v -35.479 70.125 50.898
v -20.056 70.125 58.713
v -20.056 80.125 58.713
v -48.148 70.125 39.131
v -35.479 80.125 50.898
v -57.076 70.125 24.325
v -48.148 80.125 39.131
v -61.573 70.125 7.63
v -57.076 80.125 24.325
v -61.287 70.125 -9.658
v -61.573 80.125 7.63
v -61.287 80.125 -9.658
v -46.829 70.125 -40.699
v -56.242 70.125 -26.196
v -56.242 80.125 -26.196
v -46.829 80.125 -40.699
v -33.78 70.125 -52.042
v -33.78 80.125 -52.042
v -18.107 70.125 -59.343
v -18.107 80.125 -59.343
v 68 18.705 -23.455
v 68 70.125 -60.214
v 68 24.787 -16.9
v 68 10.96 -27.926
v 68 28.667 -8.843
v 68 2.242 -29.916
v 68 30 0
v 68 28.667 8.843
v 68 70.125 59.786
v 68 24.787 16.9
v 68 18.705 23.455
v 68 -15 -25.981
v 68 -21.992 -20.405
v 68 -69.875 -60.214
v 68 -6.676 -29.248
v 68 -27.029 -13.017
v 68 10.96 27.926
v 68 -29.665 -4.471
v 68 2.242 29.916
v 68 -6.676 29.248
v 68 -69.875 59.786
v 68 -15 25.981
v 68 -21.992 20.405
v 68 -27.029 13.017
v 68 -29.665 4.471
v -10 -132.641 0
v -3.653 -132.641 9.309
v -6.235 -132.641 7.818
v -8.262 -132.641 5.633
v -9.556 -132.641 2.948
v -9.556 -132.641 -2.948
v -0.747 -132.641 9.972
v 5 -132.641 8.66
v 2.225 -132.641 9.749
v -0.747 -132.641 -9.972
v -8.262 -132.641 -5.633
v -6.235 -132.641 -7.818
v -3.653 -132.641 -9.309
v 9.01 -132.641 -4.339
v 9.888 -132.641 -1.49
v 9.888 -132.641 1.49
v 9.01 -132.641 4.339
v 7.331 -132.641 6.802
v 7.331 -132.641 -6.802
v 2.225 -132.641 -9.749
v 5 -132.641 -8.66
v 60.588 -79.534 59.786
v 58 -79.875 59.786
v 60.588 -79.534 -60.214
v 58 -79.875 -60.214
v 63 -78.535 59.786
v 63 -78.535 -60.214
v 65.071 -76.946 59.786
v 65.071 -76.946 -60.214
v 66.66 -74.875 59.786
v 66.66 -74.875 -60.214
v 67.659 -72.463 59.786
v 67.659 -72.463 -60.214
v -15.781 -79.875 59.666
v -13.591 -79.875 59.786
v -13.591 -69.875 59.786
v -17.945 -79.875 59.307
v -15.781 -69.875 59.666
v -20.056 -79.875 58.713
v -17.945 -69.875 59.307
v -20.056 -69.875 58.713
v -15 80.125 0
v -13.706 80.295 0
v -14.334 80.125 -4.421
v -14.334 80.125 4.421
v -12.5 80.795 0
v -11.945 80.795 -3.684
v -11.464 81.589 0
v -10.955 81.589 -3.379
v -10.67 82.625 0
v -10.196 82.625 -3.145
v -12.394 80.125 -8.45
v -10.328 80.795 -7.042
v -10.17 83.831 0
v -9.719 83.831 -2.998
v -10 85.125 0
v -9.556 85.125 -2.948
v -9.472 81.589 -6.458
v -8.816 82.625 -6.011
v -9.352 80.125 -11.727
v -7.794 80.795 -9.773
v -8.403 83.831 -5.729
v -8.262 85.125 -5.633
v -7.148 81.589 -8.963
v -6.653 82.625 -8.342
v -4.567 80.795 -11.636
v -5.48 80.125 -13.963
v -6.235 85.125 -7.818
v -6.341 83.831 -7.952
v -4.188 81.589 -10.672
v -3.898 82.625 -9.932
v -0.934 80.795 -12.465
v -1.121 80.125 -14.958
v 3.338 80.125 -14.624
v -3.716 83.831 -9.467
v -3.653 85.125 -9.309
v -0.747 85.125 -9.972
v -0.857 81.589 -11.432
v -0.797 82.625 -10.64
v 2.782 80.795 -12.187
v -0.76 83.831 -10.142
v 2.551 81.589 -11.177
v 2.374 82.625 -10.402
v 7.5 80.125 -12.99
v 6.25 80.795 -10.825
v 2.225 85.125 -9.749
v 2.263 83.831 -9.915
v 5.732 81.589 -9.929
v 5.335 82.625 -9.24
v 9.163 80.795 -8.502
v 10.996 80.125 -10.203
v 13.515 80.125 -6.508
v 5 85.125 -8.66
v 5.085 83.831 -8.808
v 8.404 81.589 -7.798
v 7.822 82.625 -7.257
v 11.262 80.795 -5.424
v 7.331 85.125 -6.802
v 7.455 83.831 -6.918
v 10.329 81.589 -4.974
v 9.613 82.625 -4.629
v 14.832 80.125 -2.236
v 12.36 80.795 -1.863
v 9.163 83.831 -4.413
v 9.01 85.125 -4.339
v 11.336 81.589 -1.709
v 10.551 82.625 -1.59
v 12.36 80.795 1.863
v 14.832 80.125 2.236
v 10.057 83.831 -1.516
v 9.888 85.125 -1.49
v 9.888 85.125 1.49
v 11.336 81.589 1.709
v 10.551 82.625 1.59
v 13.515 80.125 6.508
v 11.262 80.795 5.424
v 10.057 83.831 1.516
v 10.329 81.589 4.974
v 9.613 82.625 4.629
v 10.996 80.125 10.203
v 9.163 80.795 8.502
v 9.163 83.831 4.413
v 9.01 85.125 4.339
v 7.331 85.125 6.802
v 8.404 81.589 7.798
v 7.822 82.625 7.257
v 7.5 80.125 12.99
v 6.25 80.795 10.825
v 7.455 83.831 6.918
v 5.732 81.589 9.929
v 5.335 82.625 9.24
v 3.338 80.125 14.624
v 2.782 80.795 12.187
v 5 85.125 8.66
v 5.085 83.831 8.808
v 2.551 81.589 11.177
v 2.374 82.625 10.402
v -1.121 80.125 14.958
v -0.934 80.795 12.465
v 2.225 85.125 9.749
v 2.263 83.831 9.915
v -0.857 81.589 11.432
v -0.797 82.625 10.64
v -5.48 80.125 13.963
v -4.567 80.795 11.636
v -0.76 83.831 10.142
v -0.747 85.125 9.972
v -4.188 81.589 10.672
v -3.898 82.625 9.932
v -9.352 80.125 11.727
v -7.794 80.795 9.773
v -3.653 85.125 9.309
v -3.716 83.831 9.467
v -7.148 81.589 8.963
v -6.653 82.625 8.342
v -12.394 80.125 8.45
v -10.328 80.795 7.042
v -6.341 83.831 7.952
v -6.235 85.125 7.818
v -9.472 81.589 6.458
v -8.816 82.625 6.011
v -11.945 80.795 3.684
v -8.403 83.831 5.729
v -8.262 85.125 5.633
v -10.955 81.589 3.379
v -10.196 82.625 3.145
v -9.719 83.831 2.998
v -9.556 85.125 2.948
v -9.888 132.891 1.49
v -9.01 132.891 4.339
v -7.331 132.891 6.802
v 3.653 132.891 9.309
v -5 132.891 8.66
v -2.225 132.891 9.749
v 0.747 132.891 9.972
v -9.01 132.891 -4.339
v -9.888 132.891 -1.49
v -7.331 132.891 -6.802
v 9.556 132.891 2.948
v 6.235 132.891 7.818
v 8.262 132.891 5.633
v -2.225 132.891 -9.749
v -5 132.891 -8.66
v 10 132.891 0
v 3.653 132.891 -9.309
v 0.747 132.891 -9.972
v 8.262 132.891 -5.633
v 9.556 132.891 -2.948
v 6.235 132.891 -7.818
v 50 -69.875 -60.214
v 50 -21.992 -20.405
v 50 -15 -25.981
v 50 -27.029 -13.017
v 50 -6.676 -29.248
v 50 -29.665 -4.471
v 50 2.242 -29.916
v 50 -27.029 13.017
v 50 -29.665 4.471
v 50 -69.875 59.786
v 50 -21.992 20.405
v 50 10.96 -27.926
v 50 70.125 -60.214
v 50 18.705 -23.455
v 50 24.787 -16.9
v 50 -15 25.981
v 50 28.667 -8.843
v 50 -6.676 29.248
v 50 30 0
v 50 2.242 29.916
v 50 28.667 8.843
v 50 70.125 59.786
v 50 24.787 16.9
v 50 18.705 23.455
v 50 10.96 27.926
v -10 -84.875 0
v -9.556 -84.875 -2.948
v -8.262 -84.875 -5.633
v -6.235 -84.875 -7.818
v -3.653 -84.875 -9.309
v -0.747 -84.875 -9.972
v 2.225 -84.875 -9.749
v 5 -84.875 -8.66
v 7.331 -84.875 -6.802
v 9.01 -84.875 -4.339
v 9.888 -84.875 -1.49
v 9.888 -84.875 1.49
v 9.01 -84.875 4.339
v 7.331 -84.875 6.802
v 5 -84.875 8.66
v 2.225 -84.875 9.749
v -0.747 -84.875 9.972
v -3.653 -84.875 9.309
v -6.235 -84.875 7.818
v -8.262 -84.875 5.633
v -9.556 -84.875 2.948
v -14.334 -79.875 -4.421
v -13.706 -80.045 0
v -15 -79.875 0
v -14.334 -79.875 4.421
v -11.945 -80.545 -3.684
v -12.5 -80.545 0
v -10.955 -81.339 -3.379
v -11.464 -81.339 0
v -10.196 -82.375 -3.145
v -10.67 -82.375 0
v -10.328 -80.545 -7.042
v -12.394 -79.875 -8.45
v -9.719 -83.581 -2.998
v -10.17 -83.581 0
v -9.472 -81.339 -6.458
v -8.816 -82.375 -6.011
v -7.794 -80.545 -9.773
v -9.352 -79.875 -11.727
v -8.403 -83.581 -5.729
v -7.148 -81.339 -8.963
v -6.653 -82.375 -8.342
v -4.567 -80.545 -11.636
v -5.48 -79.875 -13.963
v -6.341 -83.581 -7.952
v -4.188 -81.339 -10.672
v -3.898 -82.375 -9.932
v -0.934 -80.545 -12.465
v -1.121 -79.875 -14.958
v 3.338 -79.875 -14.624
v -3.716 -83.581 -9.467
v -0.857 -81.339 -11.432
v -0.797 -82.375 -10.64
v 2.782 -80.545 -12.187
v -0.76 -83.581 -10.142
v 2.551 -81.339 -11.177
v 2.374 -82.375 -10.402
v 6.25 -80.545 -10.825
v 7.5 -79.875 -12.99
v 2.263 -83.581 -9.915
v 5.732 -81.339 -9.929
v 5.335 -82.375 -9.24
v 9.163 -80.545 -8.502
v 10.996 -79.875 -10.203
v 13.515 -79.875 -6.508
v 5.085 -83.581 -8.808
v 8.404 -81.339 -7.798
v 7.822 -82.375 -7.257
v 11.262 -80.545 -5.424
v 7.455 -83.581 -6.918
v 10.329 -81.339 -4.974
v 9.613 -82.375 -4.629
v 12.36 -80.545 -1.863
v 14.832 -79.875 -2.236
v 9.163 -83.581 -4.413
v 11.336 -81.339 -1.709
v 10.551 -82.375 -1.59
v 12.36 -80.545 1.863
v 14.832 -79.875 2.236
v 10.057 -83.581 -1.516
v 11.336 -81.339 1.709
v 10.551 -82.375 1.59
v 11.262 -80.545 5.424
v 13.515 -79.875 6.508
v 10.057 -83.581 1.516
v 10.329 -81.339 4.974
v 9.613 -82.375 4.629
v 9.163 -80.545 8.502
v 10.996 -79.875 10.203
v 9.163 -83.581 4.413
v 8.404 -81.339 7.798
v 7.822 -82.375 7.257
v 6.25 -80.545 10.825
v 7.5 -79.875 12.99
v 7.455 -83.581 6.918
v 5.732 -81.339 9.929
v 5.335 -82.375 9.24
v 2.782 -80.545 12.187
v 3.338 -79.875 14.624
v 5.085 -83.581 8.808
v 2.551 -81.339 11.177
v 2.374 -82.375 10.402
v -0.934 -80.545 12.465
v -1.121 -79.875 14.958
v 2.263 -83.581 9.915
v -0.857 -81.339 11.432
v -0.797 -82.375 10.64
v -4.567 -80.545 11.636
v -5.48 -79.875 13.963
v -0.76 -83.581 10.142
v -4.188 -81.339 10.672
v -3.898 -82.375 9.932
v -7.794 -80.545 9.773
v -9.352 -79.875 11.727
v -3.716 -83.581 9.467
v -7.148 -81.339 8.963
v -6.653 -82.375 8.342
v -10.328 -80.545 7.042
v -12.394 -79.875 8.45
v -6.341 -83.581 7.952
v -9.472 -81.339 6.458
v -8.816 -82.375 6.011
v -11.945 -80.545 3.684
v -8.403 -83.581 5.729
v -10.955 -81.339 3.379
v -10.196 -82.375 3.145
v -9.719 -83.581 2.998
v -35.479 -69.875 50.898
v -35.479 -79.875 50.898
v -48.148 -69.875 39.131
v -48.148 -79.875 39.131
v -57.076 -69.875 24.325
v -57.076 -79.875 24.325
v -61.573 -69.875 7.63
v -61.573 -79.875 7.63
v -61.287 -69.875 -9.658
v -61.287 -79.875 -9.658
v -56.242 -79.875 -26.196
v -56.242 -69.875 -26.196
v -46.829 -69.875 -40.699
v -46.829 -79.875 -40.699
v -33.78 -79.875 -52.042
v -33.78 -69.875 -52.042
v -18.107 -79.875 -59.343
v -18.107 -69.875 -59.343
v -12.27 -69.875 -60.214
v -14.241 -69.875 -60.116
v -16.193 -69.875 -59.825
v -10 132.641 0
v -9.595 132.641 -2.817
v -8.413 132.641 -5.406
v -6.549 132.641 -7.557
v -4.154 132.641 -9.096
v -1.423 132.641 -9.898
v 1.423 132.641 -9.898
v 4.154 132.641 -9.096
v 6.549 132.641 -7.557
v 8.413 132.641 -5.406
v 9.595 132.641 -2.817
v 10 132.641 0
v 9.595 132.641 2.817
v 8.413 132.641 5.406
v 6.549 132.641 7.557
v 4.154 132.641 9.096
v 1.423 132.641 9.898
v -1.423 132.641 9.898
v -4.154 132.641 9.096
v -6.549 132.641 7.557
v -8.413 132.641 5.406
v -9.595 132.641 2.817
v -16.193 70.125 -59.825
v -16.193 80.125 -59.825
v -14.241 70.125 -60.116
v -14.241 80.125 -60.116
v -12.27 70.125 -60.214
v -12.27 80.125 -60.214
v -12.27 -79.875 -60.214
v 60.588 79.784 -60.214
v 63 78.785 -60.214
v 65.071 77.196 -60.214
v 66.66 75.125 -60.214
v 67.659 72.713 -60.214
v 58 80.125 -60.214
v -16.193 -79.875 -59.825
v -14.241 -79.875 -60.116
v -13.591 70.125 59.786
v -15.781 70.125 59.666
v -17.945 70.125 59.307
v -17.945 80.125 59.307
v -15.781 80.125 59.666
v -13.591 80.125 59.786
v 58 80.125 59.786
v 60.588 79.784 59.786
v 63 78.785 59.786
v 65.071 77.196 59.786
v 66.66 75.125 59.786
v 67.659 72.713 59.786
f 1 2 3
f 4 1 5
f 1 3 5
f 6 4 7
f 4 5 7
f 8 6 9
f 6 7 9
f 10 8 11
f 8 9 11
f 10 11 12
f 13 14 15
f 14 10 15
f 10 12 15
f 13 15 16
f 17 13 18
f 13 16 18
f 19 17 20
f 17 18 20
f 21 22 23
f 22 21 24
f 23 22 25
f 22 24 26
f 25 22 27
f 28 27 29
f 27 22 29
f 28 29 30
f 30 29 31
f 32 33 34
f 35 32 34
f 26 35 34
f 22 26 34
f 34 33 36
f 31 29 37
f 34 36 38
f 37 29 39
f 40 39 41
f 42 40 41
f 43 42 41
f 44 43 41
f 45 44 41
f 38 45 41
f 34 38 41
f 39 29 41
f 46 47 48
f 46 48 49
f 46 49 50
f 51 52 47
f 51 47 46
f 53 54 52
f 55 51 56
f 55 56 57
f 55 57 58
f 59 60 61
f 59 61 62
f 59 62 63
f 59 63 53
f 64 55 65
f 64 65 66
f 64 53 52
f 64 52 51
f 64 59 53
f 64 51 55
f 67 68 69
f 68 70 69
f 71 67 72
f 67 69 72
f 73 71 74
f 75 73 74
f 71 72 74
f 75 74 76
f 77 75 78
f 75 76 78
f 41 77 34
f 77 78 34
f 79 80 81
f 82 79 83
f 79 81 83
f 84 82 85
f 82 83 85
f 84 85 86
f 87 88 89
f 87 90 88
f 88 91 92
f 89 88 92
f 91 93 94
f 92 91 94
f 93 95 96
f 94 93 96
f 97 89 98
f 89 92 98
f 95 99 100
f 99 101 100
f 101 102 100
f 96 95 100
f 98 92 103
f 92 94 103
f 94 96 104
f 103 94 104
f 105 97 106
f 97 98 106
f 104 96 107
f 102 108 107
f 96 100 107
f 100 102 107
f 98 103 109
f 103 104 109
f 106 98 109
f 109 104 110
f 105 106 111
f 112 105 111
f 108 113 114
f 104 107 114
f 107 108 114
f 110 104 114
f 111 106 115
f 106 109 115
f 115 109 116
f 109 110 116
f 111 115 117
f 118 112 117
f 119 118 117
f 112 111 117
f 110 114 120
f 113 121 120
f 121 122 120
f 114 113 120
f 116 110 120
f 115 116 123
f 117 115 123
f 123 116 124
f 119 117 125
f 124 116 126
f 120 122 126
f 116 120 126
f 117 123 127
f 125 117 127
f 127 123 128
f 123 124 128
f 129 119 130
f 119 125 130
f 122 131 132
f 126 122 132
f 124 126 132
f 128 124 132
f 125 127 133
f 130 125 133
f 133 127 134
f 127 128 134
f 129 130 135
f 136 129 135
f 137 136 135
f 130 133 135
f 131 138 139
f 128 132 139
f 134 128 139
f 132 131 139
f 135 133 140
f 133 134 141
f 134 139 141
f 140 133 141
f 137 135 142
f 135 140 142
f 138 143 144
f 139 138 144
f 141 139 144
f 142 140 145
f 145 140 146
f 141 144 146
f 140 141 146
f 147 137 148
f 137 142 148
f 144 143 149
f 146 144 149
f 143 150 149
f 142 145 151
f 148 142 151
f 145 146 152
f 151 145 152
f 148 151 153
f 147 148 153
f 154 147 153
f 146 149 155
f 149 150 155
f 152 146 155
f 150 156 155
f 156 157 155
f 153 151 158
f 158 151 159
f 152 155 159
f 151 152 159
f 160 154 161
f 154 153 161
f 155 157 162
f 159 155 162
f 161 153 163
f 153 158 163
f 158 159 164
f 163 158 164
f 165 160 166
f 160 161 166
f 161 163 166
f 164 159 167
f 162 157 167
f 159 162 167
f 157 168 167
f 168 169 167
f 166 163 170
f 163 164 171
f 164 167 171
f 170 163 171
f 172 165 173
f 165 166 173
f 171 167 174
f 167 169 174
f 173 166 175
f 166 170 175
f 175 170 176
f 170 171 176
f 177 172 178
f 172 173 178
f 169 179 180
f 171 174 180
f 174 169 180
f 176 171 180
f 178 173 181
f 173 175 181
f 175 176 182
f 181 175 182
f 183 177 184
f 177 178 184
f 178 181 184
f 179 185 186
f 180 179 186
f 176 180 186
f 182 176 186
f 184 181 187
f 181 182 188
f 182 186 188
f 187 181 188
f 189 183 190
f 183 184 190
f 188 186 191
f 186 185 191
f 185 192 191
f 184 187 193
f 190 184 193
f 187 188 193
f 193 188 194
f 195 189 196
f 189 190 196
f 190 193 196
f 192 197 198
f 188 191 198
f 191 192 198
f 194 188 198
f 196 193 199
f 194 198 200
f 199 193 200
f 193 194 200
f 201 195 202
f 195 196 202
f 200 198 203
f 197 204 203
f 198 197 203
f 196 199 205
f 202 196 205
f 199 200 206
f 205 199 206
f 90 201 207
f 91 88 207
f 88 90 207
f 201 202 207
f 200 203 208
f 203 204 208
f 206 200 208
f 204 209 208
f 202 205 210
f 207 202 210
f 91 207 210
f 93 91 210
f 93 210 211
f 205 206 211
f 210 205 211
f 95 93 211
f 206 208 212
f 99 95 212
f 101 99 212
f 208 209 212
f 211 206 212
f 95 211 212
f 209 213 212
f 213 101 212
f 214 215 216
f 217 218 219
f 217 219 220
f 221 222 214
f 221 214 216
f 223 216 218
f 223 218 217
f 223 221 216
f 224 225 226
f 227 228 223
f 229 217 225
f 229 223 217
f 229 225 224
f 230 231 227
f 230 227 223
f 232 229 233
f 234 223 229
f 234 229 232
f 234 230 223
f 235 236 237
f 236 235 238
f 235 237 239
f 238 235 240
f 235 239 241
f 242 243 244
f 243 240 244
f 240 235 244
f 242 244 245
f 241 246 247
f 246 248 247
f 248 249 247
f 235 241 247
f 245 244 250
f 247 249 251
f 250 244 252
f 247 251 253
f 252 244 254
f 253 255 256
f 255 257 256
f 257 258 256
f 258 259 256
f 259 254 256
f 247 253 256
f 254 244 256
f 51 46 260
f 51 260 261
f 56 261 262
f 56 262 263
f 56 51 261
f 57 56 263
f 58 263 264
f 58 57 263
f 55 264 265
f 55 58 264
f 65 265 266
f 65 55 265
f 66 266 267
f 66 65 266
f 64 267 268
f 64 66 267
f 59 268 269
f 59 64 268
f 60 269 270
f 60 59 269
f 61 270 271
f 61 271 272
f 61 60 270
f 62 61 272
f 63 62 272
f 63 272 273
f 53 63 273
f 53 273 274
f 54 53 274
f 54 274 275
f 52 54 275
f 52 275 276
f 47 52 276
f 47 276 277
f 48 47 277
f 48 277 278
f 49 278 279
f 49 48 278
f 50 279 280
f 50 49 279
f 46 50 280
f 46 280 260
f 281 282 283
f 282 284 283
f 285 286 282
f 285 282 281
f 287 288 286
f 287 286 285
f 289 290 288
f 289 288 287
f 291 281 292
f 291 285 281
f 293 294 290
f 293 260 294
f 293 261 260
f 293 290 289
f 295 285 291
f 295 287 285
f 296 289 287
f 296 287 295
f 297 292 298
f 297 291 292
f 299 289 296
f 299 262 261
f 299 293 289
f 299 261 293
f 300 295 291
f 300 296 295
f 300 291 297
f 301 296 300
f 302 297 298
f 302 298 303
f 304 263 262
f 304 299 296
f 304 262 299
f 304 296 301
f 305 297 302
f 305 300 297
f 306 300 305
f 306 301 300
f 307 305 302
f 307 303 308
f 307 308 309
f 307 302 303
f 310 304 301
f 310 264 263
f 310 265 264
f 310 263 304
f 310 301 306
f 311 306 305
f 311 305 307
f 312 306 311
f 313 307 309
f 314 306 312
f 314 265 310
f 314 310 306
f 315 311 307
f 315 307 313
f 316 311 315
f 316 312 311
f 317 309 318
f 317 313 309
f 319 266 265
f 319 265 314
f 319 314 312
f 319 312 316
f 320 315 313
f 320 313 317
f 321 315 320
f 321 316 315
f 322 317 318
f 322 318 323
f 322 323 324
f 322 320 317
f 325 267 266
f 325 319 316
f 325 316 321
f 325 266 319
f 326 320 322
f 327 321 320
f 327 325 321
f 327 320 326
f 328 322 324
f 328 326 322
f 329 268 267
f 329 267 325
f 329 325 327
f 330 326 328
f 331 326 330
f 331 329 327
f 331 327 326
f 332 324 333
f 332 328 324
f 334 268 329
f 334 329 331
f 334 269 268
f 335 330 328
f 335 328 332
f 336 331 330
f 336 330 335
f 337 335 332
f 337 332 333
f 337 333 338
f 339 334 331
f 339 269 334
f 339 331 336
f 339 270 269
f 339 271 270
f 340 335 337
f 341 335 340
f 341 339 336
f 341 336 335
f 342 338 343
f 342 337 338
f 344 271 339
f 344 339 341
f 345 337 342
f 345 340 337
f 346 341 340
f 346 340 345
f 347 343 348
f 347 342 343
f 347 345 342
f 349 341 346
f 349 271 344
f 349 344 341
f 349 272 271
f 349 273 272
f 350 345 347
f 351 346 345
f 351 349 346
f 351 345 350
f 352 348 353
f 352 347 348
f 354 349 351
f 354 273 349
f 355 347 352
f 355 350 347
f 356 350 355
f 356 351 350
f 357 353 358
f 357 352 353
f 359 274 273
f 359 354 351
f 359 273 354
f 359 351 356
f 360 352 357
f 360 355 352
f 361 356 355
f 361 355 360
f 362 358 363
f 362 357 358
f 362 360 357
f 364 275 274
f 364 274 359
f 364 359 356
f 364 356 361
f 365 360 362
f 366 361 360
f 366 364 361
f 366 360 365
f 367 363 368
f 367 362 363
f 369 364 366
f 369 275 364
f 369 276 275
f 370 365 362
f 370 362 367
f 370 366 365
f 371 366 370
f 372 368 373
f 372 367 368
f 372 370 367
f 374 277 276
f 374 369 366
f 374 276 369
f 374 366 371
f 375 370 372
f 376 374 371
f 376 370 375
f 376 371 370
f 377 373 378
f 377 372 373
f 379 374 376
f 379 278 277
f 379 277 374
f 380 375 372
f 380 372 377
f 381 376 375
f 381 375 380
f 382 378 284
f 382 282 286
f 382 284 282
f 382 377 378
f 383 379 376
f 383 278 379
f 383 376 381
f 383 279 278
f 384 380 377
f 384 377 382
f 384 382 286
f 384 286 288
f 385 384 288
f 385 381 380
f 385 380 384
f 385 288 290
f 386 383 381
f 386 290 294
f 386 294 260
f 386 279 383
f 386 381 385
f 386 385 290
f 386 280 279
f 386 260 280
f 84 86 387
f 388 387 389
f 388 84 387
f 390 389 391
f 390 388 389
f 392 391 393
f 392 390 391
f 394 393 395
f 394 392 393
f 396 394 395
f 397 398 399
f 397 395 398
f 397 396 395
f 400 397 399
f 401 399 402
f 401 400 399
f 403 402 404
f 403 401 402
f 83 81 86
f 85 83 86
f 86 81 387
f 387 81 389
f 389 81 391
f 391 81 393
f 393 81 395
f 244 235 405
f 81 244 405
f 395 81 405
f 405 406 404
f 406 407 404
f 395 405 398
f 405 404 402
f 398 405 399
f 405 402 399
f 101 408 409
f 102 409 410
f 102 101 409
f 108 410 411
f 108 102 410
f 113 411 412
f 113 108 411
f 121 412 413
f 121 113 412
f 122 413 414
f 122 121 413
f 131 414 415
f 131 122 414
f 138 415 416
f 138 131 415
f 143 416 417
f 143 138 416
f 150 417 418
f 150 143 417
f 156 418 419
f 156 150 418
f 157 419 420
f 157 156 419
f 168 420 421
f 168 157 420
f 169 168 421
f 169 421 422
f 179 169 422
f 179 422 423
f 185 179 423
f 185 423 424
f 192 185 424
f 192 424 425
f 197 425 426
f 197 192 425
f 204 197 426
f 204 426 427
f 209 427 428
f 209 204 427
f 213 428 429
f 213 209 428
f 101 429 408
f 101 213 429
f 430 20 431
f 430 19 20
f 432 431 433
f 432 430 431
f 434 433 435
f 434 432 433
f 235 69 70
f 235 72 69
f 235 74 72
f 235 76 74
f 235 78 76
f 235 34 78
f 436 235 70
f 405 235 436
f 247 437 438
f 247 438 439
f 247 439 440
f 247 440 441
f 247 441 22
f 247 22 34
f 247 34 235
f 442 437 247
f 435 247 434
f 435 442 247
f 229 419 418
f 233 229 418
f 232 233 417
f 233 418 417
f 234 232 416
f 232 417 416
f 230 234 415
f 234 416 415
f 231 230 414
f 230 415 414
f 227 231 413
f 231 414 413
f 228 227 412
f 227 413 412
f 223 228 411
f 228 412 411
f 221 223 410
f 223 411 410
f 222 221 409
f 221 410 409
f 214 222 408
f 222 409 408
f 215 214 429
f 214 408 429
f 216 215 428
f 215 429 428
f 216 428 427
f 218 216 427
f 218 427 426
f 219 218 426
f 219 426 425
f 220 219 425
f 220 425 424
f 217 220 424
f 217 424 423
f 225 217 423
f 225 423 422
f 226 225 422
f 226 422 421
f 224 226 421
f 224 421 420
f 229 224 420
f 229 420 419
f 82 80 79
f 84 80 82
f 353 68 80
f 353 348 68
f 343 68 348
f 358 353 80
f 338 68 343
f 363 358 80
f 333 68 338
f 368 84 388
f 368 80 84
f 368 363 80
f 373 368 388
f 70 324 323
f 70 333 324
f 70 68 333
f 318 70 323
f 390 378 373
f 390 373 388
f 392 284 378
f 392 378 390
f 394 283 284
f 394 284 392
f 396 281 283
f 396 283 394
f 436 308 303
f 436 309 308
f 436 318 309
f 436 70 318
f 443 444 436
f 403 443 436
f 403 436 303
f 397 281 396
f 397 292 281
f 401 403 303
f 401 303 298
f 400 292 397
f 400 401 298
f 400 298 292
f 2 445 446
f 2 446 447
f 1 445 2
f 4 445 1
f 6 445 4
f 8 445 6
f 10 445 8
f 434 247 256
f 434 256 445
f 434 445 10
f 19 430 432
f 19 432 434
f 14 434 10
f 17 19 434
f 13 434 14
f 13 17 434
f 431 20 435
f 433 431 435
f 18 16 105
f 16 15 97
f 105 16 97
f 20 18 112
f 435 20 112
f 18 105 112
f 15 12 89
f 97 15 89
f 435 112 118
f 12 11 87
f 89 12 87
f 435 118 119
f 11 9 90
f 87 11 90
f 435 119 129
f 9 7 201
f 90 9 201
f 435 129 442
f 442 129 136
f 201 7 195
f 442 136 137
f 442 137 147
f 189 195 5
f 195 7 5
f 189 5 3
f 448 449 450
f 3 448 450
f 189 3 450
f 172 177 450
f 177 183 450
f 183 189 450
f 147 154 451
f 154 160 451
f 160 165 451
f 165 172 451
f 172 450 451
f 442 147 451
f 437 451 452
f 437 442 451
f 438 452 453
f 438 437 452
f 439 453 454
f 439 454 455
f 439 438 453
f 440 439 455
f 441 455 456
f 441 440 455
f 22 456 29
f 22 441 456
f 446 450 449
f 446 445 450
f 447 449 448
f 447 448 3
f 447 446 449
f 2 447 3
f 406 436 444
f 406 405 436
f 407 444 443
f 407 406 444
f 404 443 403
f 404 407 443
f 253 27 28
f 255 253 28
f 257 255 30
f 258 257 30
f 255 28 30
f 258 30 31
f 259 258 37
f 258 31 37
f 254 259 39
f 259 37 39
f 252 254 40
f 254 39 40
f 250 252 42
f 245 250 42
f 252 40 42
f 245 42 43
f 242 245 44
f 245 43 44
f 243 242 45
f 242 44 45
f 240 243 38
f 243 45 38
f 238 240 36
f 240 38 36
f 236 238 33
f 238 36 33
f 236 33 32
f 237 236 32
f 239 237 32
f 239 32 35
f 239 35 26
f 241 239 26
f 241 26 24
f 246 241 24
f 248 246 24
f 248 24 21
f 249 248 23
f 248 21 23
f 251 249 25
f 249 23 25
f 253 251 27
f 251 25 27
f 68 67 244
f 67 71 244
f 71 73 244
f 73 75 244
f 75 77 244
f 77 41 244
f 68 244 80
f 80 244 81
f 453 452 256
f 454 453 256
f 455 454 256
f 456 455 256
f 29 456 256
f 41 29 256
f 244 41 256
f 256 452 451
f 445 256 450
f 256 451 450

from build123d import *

# Parameters (mm, degrees)
SWEEP1_PROFILE_R    = 10
SKETCH8_R           = 10
BOSS_EXTRUDE1_DEPTH = 0.25
BOSS_EXTRUDE2_DEPTH = 10
BOSS_EXTRUDE5_DEPTH = 120
SKETCH15_W          = 120
SKETCH15_H          = 140
CUT_EXTRUDE2_DEPTH  = 95
FILLET1_R           = 5
FILLET3_R           = 20
FILLET4_R           = 10
SKETCH16_R          = 30
CUT_EXTRUDE3_DEPTH  = 18


with BuildPart() as part:
    # Sweep1: sweep along a path in Sketch1
    with BuildLine(Plane.XY) as sweep1_path:
        Line((0, 132.640900072), (0, -132.640900072))
    # Sweep1 profile (on start of the path) → Sweep1 (sweep)
    with BuildSketch(Plane(origin=(0, 132.640900072, 0), x_dir=(-1, 0, 0), z_dir=(0, -1, 0))):
        Circle(SWEEP1_PROFILE_R)
    sweep(path=sweep1_path.line)

    # Sketch8 → Boss-Extrude1 (add)
    with BuildSketch(Plane(origin=(0, 132.640900072, 0), x_dir=(1, 0, 0), z_dir=(0, 1, 0))):
        Circle(SKETCH8_R)
    extrude(amount=BOSS_EXTRUDE1_DEPTH)

    # Sketch9 → Boss-Extrude2 (add)
    with BuildSketch(Plane(origin=(0, 80.125, 0), x_dir=(1, 0, 0), z_dir=(0, 1, 0))):
        with BuildLine():
            Line((60, -59.786486662), (-16.583123952, -59.786486662))
            ThreePointArc((-16.583123952, -59.786486662), (-62.038041158, 0.839902741), (-14.958502558, 60.213513338))
            Line((-14.958502558, 60.213513338), (60, 60.213513338))
            Line((60, 60.213513338), (60, -59.786486662))
        make_face()
    boss_extrude2 = extrude(amount=-BOSS_EXTRUDE2_DEPTH)

    # Mirror1: Boss-Extrude2 across plane
    add(boss_extrude2.mirror(Plane.ZX.offset(0.125)))

    # Sketch14 → Boss-Extrude5 (add)
    with BuildSketch(Plane.XY.offset(59.786486662)):
        Polygon((50, 70.125), (60, 70.125), (60, 80.125), (68, 80.125), (68, -79.875), (60, -79.875), (60, -69.875), (50, -69.875), align=None)
    extrude(amount=-BOSS_EXTRUDE5_DEPTH)

    # Sketch15 → Cut-Extrude2 (cut)
    with BuildSketch(Plane.ZY.offset(-50)):
        with Locations((-0.213513338, 0.125)):
            Rectangle(SKETCH15_W, SKETCH15_H)
    extrude(amount=CUT_EXTRUDE2_DEPTH, mode=Mode.SUBTRACT)

    # Fillet1
    fillet1_edges = [part.edges().sort_by_distance(p)[0] for p in [
        (10, 80.125, 0),
        (10, -79.875, 0),
    ]]
    fillet(fillet1_edges, radius=FILLET1_R)

    # Fillet3
    fillet3_edges = [part.edges().sort_by_distance(p)[0] for p in [
        (-16.583123952, 75.125, 59.786486662),
        (-14.958502558, 75.125, -60.213513338),
        (-14.958502558, -74.875, -60.213513338),
        (-16.583123952, -74.875, 59.786486662),
    ]]
    fillet(fillet3_edges, radius=FILLET3_R)

    # Fillet4
    fillet4_edges = [part.edges().sort_by_distance(p)[0] for p in [
        (68, 80.125, -0.213513338),
        (68, -79.875, -0.213513338),
    ]]
    fillet(fillet4_edges, radius=FILLET4_R)

    # Sketch16 → Cut-Extrude3 (cut)
    with BuildSketch(Plane(origin=(68, 0, 0), x_dir=(0, 0, -1), z_dir=(1, 0, 0))):
        with Locations(Location((0, 0, 0), (0, 0, 90))):
            Circle(SKETCH16_R)
    extrude(amount=-CUT_EXTRUDE3_DEPTH, mode=Mode.SUBTRACT)


solid = part.part
